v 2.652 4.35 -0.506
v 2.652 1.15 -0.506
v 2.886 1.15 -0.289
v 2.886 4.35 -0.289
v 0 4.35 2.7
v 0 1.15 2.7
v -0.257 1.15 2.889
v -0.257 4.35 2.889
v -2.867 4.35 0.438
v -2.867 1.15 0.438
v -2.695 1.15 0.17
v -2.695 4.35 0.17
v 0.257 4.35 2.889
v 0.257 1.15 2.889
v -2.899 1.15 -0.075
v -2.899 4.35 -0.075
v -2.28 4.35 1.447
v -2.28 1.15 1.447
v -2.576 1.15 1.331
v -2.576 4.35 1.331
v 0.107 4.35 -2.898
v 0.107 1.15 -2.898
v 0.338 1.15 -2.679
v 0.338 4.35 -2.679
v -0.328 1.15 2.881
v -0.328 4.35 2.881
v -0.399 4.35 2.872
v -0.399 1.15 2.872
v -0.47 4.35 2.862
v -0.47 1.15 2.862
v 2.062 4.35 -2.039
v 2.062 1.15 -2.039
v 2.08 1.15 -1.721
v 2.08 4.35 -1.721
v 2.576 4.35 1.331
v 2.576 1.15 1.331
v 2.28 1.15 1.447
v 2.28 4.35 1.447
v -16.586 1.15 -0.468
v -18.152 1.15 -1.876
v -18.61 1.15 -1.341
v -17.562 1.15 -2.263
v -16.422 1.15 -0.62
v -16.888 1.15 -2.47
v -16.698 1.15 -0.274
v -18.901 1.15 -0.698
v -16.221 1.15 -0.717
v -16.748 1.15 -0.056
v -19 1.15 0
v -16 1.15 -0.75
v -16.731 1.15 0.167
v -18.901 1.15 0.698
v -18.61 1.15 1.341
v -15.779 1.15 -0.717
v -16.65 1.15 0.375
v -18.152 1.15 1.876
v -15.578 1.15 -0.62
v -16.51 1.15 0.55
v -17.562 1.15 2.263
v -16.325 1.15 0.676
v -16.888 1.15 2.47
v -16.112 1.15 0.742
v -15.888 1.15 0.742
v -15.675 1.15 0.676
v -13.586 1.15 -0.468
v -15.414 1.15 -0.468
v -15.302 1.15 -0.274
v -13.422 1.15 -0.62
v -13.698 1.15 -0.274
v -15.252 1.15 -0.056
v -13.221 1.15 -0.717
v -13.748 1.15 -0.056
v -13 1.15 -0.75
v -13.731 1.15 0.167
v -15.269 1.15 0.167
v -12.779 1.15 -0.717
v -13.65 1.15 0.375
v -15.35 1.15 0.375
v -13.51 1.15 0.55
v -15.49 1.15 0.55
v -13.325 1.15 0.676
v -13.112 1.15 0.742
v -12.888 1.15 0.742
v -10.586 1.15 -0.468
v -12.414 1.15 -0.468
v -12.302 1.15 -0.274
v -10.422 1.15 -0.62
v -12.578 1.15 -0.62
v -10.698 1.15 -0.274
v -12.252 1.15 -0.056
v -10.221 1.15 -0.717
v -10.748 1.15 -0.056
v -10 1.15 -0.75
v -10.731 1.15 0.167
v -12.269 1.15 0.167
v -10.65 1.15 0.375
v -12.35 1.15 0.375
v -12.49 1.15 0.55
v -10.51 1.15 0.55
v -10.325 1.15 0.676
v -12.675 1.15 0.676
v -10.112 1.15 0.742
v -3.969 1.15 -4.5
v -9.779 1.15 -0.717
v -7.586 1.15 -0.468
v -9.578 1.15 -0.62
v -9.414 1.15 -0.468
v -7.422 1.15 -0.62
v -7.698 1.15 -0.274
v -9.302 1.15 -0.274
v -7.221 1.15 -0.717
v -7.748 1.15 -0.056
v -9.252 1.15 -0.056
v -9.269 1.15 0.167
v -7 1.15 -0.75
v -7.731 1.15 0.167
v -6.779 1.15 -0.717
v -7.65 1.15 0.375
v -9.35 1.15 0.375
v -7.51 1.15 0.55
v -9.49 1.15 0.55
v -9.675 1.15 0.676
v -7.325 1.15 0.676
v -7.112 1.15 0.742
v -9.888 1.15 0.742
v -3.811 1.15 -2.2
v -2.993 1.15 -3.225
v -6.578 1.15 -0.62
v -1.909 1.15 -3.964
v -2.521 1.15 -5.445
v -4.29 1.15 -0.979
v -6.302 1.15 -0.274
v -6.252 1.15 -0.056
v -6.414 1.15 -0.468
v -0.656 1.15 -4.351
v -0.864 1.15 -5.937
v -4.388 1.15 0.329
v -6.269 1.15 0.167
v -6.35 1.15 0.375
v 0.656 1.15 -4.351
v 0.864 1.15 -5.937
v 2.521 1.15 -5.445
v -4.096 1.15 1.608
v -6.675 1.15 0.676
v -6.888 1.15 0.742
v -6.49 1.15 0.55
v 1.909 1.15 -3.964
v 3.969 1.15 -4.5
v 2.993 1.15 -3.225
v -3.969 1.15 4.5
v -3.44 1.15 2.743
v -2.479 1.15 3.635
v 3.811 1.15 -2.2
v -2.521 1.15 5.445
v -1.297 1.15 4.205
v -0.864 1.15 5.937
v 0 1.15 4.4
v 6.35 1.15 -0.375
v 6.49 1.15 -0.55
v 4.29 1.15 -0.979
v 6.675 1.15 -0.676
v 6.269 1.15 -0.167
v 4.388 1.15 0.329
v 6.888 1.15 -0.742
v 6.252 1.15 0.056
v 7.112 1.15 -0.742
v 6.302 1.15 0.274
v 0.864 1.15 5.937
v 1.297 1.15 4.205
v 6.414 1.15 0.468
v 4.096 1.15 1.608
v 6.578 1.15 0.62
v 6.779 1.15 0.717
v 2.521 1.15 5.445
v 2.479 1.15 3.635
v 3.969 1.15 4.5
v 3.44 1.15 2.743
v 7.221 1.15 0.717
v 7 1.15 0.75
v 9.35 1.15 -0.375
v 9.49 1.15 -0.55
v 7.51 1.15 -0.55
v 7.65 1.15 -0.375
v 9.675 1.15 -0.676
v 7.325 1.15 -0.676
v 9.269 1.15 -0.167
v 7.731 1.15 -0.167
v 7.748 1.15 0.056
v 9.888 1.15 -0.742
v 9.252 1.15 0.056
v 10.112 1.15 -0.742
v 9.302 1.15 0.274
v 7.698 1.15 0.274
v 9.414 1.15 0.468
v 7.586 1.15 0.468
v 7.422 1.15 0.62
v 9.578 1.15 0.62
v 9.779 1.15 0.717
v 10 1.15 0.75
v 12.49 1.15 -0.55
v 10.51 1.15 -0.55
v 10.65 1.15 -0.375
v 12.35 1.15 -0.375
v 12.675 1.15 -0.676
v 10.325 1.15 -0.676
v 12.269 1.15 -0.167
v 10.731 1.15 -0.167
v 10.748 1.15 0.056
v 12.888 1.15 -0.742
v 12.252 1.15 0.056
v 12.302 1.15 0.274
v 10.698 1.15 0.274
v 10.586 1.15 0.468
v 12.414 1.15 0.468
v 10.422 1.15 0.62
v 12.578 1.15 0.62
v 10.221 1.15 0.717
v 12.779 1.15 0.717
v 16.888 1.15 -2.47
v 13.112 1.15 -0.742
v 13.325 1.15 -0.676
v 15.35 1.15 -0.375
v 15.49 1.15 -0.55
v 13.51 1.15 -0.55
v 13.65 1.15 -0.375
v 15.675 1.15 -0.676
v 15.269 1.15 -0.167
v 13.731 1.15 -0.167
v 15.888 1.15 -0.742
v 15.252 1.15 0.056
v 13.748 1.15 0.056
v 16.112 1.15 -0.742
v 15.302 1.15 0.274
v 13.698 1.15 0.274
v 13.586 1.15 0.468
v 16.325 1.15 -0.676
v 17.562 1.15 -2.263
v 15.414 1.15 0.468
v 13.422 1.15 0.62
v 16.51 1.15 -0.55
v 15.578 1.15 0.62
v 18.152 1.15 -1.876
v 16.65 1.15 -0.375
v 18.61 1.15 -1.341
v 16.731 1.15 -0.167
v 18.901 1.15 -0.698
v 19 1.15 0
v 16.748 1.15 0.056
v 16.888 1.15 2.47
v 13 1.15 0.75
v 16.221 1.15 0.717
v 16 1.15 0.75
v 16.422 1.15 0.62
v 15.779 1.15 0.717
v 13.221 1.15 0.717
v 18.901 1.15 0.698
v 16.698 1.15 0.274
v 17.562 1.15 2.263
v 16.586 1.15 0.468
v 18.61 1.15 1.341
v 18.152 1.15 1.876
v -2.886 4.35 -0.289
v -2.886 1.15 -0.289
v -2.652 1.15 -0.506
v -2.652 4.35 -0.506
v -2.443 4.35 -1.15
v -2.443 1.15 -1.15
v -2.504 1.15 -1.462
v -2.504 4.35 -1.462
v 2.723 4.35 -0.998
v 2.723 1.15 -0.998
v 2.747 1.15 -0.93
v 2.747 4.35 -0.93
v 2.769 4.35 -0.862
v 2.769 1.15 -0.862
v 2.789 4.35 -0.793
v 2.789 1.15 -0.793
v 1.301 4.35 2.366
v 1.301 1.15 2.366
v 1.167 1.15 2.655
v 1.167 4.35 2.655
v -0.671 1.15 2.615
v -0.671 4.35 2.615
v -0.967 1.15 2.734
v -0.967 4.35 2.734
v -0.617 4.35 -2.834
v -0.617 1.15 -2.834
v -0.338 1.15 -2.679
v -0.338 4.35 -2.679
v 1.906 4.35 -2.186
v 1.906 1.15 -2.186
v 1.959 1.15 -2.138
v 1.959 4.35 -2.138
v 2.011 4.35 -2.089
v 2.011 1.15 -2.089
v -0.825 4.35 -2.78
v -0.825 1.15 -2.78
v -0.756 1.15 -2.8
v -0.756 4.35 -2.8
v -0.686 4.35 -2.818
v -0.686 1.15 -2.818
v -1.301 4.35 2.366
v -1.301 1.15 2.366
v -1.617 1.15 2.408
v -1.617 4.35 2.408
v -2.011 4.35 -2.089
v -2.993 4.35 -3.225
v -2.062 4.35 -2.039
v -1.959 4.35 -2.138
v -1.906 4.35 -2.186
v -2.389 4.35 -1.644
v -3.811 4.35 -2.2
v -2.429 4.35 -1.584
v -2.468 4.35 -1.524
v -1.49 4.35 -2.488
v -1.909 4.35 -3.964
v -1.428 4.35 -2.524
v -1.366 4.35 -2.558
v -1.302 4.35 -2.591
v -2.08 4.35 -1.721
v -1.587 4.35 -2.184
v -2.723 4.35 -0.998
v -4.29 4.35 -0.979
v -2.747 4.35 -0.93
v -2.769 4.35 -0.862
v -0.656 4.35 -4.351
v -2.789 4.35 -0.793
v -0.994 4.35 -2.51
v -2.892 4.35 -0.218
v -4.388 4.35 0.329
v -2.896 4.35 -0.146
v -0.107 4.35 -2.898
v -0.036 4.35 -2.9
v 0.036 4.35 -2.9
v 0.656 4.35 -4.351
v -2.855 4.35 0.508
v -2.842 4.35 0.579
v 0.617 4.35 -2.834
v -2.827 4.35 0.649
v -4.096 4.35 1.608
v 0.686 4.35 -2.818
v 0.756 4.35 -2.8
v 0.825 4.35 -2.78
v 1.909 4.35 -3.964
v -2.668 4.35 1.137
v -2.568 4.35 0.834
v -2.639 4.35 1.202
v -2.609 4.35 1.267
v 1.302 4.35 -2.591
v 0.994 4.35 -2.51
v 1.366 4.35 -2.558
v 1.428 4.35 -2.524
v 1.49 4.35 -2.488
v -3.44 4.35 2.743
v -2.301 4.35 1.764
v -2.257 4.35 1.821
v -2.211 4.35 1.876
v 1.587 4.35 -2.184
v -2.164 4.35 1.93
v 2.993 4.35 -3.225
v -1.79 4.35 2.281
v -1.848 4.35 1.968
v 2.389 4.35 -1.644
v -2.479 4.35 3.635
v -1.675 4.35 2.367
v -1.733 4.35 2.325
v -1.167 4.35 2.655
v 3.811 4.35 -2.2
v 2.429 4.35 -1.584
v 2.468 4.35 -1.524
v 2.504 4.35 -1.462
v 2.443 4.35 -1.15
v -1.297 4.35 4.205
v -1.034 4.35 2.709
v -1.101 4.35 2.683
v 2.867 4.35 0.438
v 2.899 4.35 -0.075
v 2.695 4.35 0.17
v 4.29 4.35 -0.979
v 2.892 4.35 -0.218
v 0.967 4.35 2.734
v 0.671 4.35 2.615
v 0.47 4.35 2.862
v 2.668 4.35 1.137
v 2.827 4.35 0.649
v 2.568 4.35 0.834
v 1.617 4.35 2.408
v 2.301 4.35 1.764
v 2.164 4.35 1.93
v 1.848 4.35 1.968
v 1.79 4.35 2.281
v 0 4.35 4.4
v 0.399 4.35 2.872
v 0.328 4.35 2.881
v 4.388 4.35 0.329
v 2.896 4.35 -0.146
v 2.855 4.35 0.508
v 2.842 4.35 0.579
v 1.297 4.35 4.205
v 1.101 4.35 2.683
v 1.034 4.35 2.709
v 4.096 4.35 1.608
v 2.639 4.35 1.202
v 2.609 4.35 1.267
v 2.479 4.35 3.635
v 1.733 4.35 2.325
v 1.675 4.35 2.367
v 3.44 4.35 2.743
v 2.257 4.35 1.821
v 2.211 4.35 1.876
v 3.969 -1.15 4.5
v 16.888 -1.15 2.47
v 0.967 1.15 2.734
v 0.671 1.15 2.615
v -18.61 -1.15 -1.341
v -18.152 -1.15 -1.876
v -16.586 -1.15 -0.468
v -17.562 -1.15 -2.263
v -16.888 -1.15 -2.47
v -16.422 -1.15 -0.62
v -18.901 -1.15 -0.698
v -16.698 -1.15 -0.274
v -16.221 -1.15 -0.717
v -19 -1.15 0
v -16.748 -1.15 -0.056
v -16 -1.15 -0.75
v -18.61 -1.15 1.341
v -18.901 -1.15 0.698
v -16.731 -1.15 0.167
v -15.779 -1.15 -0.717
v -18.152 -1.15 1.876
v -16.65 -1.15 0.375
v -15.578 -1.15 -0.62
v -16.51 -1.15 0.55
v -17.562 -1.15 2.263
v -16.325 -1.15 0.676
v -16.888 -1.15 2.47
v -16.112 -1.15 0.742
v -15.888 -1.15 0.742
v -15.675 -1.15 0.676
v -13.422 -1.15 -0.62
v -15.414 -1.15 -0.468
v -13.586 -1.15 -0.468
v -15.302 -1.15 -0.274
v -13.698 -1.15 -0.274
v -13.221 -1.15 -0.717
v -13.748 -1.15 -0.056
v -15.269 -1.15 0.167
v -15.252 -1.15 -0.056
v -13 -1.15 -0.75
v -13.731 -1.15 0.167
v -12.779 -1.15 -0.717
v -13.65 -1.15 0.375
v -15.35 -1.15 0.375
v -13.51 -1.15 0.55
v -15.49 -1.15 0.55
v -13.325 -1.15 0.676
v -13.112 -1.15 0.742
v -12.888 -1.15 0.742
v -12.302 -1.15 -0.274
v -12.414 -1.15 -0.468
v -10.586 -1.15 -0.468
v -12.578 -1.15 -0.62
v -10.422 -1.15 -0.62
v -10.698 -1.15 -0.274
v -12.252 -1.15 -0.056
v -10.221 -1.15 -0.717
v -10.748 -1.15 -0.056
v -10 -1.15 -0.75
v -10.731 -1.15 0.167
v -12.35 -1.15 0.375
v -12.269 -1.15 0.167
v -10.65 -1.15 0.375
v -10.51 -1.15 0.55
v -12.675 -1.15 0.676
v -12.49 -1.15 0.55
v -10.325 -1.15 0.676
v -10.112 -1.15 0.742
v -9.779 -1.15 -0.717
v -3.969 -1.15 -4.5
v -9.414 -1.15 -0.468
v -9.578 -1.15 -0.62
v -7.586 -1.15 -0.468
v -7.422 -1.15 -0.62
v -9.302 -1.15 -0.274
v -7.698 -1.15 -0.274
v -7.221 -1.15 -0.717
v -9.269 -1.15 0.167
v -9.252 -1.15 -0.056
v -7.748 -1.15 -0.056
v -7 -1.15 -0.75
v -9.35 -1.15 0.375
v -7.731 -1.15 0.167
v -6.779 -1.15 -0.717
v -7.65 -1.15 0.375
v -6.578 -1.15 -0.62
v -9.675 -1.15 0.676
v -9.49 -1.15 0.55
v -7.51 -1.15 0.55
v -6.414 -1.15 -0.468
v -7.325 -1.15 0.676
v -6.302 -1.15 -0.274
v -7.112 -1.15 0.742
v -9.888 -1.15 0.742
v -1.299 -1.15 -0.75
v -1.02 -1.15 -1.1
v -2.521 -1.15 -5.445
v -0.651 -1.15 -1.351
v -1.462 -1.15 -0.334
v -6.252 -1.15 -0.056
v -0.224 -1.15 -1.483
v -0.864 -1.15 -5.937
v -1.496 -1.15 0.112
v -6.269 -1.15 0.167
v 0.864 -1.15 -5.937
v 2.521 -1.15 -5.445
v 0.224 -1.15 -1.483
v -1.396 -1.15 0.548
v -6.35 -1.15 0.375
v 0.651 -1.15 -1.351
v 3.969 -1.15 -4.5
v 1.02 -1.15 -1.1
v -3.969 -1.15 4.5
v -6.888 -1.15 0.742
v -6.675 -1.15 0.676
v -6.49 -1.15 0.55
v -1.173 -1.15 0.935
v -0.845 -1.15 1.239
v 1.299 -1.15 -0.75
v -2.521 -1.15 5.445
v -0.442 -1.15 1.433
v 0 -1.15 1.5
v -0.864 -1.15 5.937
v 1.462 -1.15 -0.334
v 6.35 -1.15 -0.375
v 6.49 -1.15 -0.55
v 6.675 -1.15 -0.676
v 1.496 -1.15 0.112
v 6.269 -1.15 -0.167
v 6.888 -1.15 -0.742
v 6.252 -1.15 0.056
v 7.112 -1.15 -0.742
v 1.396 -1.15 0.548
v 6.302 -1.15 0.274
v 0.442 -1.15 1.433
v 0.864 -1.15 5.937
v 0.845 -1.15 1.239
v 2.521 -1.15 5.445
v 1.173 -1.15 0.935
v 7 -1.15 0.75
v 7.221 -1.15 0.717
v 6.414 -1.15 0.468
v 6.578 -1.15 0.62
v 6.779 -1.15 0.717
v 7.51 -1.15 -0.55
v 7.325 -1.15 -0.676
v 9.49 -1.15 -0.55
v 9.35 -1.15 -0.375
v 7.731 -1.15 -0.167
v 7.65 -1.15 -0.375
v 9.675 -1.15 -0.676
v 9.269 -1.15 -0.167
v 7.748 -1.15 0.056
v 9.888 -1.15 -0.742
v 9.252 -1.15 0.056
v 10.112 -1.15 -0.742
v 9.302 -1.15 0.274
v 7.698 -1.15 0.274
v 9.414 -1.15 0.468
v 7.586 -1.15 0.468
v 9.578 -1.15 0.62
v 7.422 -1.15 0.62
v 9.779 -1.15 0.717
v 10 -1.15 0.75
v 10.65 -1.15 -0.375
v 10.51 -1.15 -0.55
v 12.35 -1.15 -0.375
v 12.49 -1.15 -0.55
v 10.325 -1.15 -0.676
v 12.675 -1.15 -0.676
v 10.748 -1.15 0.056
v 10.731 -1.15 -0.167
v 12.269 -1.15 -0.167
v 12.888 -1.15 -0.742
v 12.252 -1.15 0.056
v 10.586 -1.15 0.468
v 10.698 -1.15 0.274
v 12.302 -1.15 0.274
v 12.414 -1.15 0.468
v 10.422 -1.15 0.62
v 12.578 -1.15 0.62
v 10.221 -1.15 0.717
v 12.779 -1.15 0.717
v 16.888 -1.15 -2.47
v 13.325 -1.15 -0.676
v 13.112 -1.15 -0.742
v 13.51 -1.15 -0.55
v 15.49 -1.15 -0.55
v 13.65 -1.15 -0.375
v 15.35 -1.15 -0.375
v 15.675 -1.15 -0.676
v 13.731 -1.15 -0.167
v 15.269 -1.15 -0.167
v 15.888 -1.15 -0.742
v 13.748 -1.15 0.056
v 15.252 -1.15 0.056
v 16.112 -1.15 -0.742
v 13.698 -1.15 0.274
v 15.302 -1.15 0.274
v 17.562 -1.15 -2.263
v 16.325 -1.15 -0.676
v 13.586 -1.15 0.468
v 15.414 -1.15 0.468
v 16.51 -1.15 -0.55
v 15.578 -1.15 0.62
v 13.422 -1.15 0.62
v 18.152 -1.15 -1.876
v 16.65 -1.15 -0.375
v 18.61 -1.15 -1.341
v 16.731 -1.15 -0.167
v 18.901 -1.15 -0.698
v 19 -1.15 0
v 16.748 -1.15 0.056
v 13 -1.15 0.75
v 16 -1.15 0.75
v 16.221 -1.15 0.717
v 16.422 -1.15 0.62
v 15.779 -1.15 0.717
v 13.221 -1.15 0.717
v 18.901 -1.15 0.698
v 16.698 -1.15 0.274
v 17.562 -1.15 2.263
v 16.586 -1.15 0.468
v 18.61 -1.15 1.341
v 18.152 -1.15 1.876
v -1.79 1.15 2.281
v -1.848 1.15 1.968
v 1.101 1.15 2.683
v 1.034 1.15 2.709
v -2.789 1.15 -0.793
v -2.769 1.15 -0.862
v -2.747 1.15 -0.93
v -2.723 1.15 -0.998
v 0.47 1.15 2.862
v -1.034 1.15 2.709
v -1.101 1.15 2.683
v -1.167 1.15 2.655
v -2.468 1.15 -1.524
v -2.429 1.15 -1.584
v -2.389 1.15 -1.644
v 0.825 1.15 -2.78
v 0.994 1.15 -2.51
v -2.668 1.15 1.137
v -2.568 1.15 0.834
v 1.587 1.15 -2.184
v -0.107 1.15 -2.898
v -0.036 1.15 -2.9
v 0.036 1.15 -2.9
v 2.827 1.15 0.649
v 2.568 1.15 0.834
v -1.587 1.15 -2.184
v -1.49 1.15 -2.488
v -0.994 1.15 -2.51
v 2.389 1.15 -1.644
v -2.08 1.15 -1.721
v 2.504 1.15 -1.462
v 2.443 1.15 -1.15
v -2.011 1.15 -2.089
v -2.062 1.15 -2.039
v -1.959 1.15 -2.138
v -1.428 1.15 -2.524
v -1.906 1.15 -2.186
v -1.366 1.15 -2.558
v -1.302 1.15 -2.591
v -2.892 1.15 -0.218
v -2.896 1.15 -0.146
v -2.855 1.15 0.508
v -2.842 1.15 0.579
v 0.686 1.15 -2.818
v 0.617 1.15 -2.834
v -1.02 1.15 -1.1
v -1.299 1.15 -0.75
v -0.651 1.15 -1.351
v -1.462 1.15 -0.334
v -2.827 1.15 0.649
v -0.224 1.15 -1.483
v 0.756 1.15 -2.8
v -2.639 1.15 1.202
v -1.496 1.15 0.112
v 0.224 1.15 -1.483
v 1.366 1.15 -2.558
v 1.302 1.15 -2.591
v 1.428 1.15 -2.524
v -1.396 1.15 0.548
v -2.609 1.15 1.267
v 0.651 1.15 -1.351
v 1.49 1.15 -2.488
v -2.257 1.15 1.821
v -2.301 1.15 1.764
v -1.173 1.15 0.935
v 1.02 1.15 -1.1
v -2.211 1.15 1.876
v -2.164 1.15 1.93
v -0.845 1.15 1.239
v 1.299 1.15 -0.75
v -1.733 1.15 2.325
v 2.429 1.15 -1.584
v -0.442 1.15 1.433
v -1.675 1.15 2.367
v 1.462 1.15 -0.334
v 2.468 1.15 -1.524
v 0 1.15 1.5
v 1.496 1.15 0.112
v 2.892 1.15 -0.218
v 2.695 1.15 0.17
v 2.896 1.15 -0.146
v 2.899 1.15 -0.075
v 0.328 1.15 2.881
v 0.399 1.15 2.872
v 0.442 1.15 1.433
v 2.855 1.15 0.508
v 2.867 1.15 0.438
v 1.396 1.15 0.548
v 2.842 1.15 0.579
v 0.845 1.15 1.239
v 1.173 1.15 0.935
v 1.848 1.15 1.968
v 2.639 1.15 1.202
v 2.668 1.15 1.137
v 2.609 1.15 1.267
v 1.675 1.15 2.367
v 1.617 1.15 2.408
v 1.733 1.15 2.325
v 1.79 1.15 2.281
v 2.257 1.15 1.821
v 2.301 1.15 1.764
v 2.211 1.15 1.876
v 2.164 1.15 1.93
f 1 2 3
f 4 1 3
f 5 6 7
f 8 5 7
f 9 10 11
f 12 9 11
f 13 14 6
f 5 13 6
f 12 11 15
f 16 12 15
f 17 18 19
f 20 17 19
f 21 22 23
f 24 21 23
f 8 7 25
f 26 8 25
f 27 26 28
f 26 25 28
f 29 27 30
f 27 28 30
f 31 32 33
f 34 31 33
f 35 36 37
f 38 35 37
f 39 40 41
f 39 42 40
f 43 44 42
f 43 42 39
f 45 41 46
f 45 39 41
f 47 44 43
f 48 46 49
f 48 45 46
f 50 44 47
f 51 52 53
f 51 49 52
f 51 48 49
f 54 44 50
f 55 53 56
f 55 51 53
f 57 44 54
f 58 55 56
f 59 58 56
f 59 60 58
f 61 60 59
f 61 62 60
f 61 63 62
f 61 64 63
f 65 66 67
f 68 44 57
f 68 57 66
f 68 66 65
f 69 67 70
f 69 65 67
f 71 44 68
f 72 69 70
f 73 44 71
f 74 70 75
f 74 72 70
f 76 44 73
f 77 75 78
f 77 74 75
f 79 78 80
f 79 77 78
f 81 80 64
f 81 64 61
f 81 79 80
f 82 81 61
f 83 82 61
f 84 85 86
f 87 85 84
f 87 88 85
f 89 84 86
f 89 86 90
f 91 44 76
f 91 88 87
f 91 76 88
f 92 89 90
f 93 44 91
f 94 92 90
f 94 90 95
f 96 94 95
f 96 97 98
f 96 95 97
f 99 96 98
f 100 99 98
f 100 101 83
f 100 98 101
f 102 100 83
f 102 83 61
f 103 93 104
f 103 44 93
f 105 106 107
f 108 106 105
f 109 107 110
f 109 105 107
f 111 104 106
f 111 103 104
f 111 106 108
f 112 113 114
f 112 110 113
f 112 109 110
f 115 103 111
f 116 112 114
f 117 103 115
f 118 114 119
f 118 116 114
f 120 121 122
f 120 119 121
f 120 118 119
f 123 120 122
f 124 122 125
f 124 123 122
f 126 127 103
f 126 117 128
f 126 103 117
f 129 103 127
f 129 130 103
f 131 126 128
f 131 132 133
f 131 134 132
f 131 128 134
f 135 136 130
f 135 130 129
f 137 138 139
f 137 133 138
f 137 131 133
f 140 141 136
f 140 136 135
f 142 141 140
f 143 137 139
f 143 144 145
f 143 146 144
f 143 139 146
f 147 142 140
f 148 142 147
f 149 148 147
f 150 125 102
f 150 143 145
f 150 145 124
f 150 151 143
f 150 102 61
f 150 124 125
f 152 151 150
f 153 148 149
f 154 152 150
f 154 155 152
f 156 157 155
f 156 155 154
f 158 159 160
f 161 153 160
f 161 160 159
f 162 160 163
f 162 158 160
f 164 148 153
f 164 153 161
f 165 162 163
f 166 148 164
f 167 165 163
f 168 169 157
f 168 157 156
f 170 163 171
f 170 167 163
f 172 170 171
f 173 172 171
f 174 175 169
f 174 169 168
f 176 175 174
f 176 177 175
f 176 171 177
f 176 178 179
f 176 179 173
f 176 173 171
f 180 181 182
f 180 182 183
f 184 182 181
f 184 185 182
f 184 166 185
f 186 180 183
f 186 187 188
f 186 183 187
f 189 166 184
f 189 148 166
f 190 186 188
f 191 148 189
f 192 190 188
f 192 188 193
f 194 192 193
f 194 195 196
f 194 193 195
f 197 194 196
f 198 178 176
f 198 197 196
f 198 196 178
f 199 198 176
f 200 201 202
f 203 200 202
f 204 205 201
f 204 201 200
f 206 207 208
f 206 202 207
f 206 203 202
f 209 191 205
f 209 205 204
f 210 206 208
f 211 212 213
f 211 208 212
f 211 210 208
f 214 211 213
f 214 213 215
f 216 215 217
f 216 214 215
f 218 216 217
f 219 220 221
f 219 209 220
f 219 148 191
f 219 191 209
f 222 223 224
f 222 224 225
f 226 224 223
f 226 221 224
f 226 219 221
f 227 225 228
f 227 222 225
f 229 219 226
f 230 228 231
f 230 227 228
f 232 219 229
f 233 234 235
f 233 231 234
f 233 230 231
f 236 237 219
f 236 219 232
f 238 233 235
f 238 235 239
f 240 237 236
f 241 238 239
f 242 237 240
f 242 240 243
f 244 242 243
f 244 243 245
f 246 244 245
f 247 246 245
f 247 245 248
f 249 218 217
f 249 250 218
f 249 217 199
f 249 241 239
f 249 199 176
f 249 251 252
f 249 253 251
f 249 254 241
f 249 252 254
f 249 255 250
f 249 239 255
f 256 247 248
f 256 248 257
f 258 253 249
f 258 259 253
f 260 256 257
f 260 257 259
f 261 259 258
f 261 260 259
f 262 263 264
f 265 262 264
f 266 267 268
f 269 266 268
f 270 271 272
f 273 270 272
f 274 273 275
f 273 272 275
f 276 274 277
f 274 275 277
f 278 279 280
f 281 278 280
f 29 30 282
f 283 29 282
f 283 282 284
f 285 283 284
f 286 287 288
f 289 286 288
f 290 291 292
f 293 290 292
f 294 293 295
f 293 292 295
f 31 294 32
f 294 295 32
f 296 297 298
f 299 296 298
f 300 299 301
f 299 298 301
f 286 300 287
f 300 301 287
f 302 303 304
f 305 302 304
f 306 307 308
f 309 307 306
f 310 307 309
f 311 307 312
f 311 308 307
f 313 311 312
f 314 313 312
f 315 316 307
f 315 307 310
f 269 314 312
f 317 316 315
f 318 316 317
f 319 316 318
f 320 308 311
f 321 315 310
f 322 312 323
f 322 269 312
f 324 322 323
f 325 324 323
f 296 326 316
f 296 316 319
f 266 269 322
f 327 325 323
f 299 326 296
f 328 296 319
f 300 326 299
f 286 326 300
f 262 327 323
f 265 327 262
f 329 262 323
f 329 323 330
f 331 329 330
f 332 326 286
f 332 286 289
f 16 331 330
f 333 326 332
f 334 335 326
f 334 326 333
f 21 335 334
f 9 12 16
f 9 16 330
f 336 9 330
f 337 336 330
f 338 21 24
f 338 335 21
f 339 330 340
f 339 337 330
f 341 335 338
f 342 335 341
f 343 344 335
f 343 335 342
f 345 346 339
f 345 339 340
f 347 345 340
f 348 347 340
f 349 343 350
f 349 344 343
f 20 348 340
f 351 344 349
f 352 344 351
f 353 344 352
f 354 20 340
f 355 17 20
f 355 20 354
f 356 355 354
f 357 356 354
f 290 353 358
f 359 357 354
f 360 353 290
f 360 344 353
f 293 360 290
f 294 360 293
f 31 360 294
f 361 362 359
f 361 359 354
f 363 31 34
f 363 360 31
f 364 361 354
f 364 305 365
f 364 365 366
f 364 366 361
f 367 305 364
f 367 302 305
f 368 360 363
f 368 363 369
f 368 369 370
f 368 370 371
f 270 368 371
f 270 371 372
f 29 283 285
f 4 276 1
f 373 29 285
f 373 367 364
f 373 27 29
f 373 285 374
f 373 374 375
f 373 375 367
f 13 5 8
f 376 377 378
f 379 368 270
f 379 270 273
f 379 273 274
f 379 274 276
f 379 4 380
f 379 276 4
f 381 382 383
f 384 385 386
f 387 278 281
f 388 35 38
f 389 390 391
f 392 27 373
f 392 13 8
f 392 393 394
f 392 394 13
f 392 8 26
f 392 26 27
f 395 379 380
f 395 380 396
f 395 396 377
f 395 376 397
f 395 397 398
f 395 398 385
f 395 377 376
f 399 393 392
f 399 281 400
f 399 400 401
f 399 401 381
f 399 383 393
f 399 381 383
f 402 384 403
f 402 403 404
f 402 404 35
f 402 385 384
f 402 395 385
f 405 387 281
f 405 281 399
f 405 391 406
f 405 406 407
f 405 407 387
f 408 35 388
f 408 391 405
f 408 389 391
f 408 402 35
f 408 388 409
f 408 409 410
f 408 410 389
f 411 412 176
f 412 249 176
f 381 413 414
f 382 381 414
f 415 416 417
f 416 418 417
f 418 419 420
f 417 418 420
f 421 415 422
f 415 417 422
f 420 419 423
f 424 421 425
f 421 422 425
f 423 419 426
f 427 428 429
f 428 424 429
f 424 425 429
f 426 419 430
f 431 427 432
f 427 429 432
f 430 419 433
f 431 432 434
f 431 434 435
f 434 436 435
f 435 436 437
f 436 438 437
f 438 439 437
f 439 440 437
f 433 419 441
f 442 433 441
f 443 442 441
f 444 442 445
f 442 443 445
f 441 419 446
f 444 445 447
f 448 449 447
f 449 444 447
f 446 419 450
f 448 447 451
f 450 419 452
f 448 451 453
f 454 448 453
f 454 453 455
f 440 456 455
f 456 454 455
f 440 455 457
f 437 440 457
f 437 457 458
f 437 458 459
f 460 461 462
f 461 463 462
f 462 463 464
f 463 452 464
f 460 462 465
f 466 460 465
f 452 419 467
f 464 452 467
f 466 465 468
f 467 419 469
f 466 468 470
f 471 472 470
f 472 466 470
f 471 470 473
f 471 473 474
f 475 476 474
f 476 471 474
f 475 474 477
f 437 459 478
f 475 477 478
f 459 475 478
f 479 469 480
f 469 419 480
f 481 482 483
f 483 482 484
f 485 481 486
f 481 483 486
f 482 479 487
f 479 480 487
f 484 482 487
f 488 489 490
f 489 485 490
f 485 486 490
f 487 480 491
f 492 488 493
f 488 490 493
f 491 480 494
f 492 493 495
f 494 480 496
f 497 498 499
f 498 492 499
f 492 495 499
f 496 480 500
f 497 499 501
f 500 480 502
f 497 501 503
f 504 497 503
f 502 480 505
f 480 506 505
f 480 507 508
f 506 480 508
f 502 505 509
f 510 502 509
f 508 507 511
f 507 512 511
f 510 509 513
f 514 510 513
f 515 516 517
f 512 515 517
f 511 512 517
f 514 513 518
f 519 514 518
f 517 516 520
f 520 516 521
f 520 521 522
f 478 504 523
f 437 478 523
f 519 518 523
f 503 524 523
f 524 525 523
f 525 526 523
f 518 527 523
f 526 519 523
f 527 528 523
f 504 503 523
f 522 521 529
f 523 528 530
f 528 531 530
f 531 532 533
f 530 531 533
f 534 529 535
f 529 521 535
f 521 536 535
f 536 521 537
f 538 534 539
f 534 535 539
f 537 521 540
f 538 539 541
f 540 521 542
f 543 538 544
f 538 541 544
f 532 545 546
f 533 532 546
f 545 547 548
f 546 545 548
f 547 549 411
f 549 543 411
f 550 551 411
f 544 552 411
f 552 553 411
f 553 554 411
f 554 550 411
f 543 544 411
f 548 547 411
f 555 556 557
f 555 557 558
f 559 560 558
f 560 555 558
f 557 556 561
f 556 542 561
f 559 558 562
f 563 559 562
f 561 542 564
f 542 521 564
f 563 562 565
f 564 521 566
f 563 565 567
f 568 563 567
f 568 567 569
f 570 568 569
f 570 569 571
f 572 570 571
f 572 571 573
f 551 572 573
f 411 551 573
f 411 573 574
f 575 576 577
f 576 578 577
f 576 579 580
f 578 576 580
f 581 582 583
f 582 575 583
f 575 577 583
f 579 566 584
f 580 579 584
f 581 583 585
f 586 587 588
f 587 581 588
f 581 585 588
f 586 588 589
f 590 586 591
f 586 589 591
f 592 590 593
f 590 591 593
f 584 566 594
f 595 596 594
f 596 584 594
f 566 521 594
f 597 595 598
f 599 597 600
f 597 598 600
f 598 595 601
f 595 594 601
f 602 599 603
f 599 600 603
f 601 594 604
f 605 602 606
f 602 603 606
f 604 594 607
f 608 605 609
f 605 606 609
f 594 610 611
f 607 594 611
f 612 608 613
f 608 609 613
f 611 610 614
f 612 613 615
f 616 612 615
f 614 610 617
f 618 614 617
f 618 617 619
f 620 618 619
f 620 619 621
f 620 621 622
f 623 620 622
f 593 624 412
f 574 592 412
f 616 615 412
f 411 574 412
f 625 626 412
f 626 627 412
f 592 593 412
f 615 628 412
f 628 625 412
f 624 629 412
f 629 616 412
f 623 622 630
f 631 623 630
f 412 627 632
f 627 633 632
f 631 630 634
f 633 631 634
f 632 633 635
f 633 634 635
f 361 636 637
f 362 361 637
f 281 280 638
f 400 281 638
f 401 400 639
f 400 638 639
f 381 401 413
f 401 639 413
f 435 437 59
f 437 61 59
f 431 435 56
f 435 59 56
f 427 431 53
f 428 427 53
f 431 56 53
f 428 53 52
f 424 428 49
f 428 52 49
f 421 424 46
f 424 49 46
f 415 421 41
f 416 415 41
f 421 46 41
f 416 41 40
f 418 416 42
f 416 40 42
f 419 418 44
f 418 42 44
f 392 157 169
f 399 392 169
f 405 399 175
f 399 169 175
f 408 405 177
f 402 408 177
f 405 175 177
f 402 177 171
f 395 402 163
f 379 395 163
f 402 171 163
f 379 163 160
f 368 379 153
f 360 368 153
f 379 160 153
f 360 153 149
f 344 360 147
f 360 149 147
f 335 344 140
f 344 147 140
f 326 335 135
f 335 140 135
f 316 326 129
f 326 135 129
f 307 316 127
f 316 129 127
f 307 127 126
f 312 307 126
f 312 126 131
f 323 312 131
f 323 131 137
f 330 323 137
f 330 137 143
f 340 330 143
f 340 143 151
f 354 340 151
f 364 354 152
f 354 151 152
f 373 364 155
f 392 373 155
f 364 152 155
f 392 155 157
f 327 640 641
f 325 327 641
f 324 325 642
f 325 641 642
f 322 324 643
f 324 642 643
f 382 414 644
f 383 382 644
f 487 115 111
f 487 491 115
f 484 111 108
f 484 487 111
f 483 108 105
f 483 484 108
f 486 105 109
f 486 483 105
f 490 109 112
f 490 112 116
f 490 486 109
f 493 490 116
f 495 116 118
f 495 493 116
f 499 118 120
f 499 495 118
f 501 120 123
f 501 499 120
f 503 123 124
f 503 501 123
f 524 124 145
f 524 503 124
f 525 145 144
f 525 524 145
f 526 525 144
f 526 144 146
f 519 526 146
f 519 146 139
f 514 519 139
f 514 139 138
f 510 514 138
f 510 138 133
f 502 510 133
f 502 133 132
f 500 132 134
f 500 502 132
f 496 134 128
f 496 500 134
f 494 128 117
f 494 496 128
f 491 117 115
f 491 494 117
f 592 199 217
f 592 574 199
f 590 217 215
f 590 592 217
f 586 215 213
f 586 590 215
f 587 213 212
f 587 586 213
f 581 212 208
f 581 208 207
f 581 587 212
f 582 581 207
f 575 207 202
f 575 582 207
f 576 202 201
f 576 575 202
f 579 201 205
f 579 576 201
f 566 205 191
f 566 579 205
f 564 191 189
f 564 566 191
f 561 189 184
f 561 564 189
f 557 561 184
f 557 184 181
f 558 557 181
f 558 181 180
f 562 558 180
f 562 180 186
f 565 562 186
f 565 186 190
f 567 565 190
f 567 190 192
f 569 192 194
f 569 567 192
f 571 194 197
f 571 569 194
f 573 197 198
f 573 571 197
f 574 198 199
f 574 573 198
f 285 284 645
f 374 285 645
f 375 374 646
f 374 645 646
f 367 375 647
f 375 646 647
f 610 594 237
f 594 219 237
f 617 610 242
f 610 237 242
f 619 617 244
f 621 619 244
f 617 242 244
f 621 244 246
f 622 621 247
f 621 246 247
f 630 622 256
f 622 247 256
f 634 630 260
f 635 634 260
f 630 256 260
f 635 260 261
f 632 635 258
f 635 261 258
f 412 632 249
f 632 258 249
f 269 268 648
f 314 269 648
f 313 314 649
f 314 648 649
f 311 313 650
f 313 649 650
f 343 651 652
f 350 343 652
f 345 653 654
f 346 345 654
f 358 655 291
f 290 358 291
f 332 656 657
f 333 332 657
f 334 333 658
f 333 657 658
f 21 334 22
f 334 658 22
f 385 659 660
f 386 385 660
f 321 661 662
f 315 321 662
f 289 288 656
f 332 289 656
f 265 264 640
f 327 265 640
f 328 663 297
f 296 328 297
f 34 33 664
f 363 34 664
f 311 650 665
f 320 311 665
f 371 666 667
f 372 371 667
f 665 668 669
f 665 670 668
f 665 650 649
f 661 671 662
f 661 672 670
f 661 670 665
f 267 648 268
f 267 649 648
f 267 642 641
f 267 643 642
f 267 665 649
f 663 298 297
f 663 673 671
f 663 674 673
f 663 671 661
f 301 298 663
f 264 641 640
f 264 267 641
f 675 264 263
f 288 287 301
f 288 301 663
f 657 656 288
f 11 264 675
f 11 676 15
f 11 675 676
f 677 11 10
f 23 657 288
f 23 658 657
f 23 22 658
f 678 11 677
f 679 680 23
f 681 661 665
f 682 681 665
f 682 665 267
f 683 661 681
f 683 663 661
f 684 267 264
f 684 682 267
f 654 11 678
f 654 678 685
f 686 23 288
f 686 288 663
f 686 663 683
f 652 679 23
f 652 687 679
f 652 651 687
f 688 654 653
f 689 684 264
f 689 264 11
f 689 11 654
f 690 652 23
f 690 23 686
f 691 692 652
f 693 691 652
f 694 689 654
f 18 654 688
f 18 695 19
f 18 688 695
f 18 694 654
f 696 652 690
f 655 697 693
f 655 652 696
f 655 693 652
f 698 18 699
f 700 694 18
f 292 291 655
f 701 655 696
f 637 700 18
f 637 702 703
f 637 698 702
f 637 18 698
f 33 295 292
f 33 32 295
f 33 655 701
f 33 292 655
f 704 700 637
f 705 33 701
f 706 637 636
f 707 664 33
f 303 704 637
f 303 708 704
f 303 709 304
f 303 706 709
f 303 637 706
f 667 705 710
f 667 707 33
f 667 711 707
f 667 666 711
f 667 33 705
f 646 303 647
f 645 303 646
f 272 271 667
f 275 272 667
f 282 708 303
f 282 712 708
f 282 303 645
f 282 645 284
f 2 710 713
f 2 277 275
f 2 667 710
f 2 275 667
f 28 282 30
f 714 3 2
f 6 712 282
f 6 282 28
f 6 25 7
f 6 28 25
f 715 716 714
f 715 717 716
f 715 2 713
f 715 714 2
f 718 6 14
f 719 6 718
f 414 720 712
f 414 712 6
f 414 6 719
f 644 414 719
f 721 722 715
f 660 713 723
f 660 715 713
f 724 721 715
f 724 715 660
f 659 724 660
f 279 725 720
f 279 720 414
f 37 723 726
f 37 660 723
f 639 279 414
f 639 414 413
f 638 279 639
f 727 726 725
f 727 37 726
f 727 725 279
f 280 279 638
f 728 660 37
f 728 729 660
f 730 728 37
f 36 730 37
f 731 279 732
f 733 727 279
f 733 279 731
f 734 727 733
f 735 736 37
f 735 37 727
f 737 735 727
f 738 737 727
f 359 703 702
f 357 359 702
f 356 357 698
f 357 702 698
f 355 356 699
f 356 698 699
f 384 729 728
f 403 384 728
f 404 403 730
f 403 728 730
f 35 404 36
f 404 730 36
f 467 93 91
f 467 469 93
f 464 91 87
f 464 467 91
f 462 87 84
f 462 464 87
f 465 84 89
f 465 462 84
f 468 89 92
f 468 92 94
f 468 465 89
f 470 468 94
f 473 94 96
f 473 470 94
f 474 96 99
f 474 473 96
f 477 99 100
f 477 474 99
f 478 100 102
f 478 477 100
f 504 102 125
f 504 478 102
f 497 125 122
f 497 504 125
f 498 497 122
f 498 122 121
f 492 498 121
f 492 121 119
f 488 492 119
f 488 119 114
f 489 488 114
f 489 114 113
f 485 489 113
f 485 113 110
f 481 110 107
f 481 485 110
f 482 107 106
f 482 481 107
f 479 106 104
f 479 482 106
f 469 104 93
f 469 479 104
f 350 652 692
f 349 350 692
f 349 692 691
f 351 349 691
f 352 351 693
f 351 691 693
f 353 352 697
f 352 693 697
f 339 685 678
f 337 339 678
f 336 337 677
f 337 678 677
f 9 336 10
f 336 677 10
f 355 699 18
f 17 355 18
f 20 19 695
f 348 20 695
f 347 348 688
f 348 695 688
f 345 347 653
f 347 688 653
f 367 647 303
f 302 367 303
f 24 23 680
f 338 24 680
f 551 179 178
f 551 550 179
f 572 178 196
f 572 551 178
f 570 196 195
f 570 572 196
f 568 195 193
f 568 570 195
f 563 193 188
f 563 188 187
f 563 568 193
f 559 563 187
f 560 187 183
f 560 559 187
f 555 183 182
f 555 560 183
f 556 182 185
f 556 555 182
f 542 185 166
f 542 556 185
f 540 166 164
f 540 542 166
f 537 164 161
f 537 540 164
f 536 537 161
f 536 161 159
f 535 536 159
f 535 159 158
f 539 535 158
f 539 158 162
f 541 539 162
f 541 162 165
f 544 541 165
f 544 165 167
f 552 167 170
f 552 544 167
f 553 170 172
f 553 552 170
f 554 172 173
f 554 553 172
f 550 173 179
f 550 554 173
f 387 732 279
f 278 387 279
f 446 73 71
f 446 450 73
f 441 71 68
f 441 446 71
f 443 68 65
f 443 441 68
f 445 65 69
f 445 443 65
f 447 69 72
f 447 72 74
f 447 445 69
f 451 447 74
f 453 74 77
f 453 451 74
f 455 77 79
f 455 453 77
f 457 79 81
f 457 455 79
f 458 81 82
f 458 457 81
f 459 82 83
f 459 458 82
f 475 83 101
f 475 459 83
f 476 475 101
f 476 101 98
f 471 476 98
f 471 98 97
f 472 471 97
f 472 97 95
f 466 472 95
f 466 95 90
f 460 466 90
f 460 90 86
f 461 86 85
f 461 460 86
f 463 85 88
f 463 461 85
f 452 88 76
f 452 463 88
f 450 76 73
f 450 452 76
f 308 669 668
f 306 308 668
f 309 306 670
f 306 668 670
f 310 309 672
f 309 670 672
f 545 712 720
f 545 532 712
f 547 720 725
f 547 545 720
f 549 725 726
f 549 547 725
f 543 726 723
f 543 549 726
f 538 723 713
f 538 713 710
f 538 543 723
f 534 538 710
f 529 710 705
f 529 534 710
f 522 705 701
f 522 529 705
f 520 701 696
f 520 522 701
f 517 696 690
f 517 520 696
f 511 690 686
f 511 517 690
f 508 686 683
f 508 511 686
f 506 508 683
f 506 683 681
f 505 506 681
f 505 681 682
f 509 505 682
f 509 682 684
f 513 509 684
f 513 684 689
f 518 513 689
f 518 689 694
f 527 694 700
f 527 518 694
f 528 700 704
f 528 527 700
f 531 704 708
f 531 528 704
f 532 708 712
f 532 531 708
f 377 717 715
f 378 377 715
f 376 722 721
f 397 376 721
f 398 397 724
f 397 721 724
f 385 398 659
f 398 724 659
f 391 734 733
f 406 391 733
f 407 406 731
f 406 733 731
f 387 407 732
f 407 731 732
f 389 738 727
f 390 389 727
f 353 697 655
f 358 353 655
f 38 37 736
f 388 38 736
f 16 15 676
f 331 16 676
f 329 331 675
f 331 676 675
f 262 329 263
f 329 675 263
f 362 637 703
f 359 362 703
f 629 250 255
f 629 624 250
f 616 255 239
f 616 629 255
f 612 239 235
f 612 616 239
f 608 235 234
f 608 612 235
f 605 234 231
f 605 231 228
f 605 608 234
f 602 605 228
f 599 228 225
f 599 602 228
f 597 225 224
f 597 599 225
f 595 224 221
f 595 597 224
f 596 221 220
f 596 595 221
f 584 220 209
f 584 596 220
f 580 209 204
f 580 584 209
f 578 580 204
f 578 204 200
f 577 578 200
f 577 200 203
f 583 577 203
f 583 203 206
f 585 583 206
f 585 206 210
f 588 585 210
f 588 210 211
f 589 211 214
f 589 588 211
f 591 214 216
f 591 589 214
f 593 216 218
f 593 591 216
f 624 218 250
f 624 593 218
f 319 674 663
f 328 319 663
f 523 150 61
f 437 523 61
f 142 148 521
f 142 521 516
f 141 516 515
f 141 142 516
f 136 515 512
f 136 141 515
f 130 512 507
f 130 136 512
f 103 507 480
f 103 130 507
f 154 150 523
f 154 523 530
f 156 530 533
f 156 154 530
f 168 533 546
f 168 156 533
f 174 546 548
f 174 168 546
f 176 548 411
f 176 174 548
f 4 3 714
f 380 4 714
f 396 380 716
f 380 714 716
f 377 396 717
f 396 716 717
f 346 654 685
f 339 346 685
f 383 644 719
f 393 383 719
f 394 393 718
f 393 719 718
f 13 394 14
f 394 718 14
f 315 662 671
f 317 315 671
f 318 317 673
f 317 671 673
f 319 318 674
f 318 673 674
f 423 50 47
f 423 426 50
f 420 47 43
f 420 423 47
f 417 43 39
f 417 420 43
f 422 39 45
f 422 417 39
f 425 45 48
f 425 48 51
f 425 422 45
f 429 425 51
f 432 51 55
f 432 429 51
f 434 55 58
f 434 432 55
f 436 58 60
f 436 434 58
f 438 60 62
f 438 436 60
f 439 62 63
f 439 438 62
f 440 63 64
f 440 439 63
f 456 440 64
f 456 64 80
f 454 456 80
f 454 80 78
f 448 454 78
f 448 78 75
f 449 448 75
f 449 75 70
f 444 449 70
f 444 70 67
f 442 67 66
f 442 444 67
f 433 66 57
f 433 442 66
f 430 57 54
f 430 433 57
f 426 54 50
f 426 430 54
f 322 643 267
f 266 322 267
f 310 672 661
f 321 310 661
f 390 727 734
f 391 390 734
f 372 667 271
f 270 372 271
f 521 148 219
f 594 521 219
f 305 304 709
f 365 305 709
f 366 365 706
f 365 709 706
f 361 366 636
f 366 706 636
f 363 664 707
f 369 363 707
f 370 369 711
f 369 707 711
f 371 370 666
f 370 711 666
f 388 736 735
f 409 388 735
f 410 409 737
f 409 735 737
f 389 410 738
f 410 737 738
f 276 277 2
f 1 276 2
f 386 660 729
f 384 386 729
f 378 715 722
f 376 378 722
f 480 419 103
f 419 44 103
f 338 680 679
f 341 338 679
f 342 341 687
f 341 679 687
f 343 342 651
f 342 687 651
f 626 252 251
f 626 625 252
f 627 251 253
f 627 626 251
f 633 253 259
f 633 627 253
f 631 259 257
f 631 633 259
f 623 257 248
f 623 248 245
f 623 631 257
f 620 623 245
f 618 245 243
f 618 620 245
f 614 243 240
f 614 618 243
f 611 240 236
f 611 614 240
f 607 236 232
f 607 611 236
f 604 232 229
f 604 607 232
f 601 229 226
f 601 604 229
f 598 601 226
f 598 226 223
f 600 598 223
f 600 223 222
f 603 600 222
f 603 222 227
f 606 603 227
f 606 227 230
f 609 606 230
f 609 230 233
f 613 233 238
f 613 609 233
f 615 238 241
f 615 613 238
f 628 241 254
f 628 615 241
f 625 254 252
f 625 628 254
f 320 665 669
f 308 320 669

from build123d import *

# Parameters (mm, degrees)
SKETCH2_R           = 6
SKETCH2_R_2         = 1.5
BOSS_EXTRUDE1_DEPTH = 1.15
SKETCH3_R           = 4.4
BOSS_EXTRUDE2_DEPTH = 3.2
SKETCH4_R           = 0.75
BOSS_EXTRUDE3_DEPTH = 1.15
CIRPATTERN1_COUNT   = 2


with BuildPart() as part:
    # Sketch2 → Boss-Extrude1 (new, symmetric)
    with BuildSketch(Plane(origin=(0, 0, 0), x_dir=(1, 0, 0), z_dir=(0, 1, 0))):
        with Locations(Location((0, 0, 0), (0, 0, 270))):
            Circle(SKETCH2_R)
        with Locations(Location((0, 0, 0), (0, 0, 270))):
            Circle(SKETCH2_R_2, mode=Mode.SUBTRACT)
    extrude(amount=BOSS_EXTRUDE1_DEPTH, both=True)

    # Sketch3 → Boss-Extrude2 (add)
    with BuildSketch(Plane(origin=(0, 1.15, 0), x_dir=(1, 0, 0), z_dir=(0, 1, 0))):
        with Locations(Location((0, 0, 0), (0, 0, 270))):
            Circle(SKETCH3_R)
        with BuildLine():
            Line((0.107421435, 2.898009771), (0.338399731, 2.678709694))
            Line((0.338399731, 2.678709694), (0.61665913, 2.83367809))
            ThreePointArc((0.61665913, 2.83367809), (0.721200673, 2.808891167), (0.824752316, 2.780248841))
            Line((0.824752316, 2.780248841), (0.993936292, 2.510396512))
            Line((0.993936292, 2.510396512), (1.301992734, 2.591295993))
            ThreePointArc((1.301992734, 2.591295993), (1.397085655, 2.541289372), (1.490260976, 2.48779465))
            Line((1.490260976, 2.48779465), (1.587020181, 2.184345885))
            Line((1.587020181, 2.184345885), (1.905517346, 2.186093238))
            ThreePointArc((1.905517346, 2.186093238), (1.985186607, 2.11400902), (2.062131058, 2.039023173))
            Line((2.062131058, 2.039023173), (2.080385755, 1.721044772))
            Line((2.080385755, 1.721044772), (2.389311295, 1.643530205))
            ThreePointArc((2.389311295, 1.643530205), (2.448550984, 1.553897705), (2.504429862, 1.46213237))
            Line((2.504429862, 1.46213237), (2.443033042, 1.149604087))
            Line((2.443033042, 1.149604087), (2.722976028, 0.997698125))
            ThreePointArc((2.722976028, 0.997698125), (2.758063897, 0.896149284), (2.789366126, 0.793370413))
            Line((2.789366126, 0.793370413), (2.652175577, 0.505929549))
            Line((2.652175577, 0.505929549), (2.885546163, 0.289177003))
            ThreePointArc((2.885546163, 0.289177003), (2.894277512, 0.182092507), (2.899036259, 0.074758075))
            Line((2.899036259, 0.074758075), (2.694672167, -0.169534403))
            Line((2.694672167, -0.169534403), (2.866806821, -0.437514174))
            ThreePointArc((2.866806821, -0.437514174), (2.848633027, -0.543405812), (2.826549281, -0.648551587))
            Line((2.826549281, -0.648551587), (2.567852594, -0.834345885))
            Line((2.567852594, -0.834345885), (2.667935462, -1.136714727))
            ThreePointArc((2.667935462, -1.136714727), (2.623998452, -1.234759946), (2.576459817, -1.331110368))
            Line((2.576459817, -1.331110368), (2.279685399, -1.446732346))
            Line((2.279685399, -1.446732346), (2.301427906, -1.764491312))
            ThreePointArc((2.301427906, -1.764491312), (2.234488404, -1.84852957), (2.164481907, -1.930030589))
            Line((2.164481907, -1.930030589), (1.848277186, -1.968215294))
            Line((1.848277186, -1.968215294), (1.790313171, -2.281398419))
            ThreePointArc((1.790313171, -2.281398419), (1.704577232, -2.346149284), (1.616501638, -2.40767989))
            Line((1.616501638, -2.40767989), (1.30073492, -2.366028036))
            Line((1.30073492, -2.366028036), (1.166706475, -2.654956874))
            ThreePointArc((1.166706475, -2.654956874), (1.067561203, -2.696351809), (0.966950626, -2.734045809))
            Line((0.966950626, -2.734045809), (0.671462695, -2.615174535))
            Line((0.671462695, -2.615174535), (0.469791321, -2.861694623))
            ThreePointArc((0.469791321, -2.861694623), (0.363466377, -2.877132634), (0.25664255, -2.888621575))
            Line((0.25664255, -2.888621575), (0, -2.7))
            Line((0, -2.7), (-0.25664255, -2.888621575))
            ThreePointArc((-0.25664255, -2.888621575), (-0.363466377, -2.877132634), (-0.469791321, -2.861694623))
            Line((-0.469791321, -2.861694623), (-0.671462695, -2.615174535))
            Line((-0.671462695, -2.615174535), (-0.966950626, -2.734045809))
            ThreePointArc((-0.966950626, -2.734045809), (-1.067561203, -2.696351809), (-1.166706475, -2.654956874))
            Line((-1.166706475, -2.654956874), (-1.30073492, -2.366028036))
            Line((-1.30073492, -2.366028036), (-1.616501638, -2.40767989))
            ThreePointArc((-1.616501638, -2.40767989), (-1.704577232, -2.346149284), (-1.790313171, -2.281398419))
            Line((-1.790313171, -2.281398419), (-1.848277186, -1.968215294))
            Line((-1.848277186, -1.968215294), (-2.164481907, -1.930030589))
            ThreePointArc((-2.164481907, -1.930030589), (-2.234488404, -1.84852957), (-2.301427906, -1.764491312))
            Line((-2.301427906, -1.764491312), (-2.279685399, -1.446732346))
            Line((-2.279685399, -1.446732346), (-2.576459817, -1.331110368))
            ThreePointArc((-2.576459817, -1.331110368), (-2.623998452, -1.234759946), (-2.667935462, -1.136714727))
            Line((-2.667935462, -1.136714727), (-2.567852594, -0.834345885))
            Line((-2.567852594, -0.834345885), (-2.826549281, -0.648551587))
            ThreePointArc((-2.826549281, -0.648551587), (-2.848633027, -0.543405812), (-2.866806821, -0.437514174))
            Line((-2.866806821, -0.437514174), (-2.694672167, -0.169534403))
            Line((-2.694672167, -0.169534403), (-2.899036259, 0.074758075))
            ThreePointArc((-2.899036259, 0.074758075), (-2.894277512, 0.182092507), (-2.885546163, 0.289177003))
            Line((-2.885546163, 0.289177003), (-2.652175577, 0.505929549))
            Line((-2.652175577, 0.505929549), (-2.789366126, 0.793370413))
            ThreePointArc((-2.789366126, 0.793370413), (-2.758063897, 0.896149284), (-2.722976028, 0.997698125))
            Line((-2.722976028, 0.997698125), (-2.443033042, 1.149604087))
            Line((-2.443033042, 1.149604087), (-2.504429862, 1.46213237))
            ThreePointArc((-2.504429862, 1.46213237), (-2.448550984, 1.553897705), (-2.389311295, 1.643530205))
            Line((-2.389311295, 1.643530205), (-2.080385755, 1.721044772))
            Line((-2.080385755, 1.721044772), (-2.062131058, 2.039023173))
            ThreePointArc((-2.062131058, 2.039023173), (-1.985186607, 2.11400902), (-1.905517346, 2.186093238))
            Line((-1.905517346, 2.186093238), (-1.587020181, 2.184345885))
            Line((-1.587020181, 2.184345885), (-1.490260976, 2.48779465))
            ThreePointArc((-1.490260976, 2.48779465), (-1.397085655, 2.541289372), (-1.301992734, 2.591295993))
            Line((-1.301992734, 2.591295993), (-0.993936292, 2.510396512))
            Line((-0.993936292, 2.510396512), (-0.824752316, 2.780248841))
            ThreePointArc((-0.824752316, 2.780248841), (-0.721200673, 2.808891167), (-0.61665913, 2.83367809))
            Line((-0.61665913, 2.83367809), (-0.338399731, 2.678709694))
            Line((-0.338399731, 2.678709694), (-0.107421435, 2.898009771))
            ThreePointArc((-0.107421435, 2.898009771), (0, 2.9), (0.107421435, 2.898009771))
        make_face(mode=Mode.SUBTRACT)
    extrude(amount=BOSS_EXTRUDE2_DEPTH)

    # Sketch4 → Boss-Extrude3 (add, symmetric)
    with BuildSketch(Plane(origin=(0, 0, 0), x_dir=(1, 0, 0), z_dir=(0, 1, 0))):
        with BuildLine():
            Line((3.968626967, 4.5), (16.888114198, 2.469689731))
            ThreePointArc((16.888114198, 2.469689731), (19, 0), (16.888114198, -2.469689731))
            Line((16.888114198, -2.469689731), (3.968626967, -4.5))
            ThreePointArc((3.968626967, -4.5), (6, 0), (3.968626967, 4.5))
        make_face()
        with Locations(Location((16, 0, 0), (0, 0, 270))):
            Circle(SKETCH4_R, mode=Mode.SUBTRACT)
        with Locations(Location((13, 0, 0), (0, 0, 270))):
            Circle(SKETCH4_R, mode=Mode.SUBTRACT)
        with Locations(Location((10, 0, 0), (0, 0, 270))):
            Circle(SKETCH4_R, mode=Mode.SUBTRACT)
        with Locations(Location((7, 0, 0), (0, 0, 270))):
            Circle(SKETCH4_R, mode=Mode.SUBTRACT)
    boss_extrude3 = extrude(amount=BOSS_EXTRUDE3_DEPTH, both=True)

    # CirPattern1: Boss-Extrude3 ×2 about axis
    cirpattern1_axis = Axis((0, 0, 0), (0, 1, 0))
    for i in range(1, CIRPATTERN1_COUNT):
        add(boss_extrude3.rotate(cirpattern1_axis, i * 360 / CIRPATTERN1_COUNT))


solid = part.part
